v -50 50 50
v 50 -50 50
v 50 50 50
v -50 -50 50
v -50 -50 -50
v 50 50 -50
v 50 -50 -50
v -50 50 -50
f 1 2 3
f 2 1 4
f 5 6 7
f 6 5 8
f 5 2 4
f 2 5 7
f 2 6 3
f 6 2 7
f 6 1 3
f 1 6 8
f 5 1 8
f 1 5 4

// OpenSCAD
length = 100.0;
width = 100.0;
height = 100.0;
cube([length, width, height], center=true);
